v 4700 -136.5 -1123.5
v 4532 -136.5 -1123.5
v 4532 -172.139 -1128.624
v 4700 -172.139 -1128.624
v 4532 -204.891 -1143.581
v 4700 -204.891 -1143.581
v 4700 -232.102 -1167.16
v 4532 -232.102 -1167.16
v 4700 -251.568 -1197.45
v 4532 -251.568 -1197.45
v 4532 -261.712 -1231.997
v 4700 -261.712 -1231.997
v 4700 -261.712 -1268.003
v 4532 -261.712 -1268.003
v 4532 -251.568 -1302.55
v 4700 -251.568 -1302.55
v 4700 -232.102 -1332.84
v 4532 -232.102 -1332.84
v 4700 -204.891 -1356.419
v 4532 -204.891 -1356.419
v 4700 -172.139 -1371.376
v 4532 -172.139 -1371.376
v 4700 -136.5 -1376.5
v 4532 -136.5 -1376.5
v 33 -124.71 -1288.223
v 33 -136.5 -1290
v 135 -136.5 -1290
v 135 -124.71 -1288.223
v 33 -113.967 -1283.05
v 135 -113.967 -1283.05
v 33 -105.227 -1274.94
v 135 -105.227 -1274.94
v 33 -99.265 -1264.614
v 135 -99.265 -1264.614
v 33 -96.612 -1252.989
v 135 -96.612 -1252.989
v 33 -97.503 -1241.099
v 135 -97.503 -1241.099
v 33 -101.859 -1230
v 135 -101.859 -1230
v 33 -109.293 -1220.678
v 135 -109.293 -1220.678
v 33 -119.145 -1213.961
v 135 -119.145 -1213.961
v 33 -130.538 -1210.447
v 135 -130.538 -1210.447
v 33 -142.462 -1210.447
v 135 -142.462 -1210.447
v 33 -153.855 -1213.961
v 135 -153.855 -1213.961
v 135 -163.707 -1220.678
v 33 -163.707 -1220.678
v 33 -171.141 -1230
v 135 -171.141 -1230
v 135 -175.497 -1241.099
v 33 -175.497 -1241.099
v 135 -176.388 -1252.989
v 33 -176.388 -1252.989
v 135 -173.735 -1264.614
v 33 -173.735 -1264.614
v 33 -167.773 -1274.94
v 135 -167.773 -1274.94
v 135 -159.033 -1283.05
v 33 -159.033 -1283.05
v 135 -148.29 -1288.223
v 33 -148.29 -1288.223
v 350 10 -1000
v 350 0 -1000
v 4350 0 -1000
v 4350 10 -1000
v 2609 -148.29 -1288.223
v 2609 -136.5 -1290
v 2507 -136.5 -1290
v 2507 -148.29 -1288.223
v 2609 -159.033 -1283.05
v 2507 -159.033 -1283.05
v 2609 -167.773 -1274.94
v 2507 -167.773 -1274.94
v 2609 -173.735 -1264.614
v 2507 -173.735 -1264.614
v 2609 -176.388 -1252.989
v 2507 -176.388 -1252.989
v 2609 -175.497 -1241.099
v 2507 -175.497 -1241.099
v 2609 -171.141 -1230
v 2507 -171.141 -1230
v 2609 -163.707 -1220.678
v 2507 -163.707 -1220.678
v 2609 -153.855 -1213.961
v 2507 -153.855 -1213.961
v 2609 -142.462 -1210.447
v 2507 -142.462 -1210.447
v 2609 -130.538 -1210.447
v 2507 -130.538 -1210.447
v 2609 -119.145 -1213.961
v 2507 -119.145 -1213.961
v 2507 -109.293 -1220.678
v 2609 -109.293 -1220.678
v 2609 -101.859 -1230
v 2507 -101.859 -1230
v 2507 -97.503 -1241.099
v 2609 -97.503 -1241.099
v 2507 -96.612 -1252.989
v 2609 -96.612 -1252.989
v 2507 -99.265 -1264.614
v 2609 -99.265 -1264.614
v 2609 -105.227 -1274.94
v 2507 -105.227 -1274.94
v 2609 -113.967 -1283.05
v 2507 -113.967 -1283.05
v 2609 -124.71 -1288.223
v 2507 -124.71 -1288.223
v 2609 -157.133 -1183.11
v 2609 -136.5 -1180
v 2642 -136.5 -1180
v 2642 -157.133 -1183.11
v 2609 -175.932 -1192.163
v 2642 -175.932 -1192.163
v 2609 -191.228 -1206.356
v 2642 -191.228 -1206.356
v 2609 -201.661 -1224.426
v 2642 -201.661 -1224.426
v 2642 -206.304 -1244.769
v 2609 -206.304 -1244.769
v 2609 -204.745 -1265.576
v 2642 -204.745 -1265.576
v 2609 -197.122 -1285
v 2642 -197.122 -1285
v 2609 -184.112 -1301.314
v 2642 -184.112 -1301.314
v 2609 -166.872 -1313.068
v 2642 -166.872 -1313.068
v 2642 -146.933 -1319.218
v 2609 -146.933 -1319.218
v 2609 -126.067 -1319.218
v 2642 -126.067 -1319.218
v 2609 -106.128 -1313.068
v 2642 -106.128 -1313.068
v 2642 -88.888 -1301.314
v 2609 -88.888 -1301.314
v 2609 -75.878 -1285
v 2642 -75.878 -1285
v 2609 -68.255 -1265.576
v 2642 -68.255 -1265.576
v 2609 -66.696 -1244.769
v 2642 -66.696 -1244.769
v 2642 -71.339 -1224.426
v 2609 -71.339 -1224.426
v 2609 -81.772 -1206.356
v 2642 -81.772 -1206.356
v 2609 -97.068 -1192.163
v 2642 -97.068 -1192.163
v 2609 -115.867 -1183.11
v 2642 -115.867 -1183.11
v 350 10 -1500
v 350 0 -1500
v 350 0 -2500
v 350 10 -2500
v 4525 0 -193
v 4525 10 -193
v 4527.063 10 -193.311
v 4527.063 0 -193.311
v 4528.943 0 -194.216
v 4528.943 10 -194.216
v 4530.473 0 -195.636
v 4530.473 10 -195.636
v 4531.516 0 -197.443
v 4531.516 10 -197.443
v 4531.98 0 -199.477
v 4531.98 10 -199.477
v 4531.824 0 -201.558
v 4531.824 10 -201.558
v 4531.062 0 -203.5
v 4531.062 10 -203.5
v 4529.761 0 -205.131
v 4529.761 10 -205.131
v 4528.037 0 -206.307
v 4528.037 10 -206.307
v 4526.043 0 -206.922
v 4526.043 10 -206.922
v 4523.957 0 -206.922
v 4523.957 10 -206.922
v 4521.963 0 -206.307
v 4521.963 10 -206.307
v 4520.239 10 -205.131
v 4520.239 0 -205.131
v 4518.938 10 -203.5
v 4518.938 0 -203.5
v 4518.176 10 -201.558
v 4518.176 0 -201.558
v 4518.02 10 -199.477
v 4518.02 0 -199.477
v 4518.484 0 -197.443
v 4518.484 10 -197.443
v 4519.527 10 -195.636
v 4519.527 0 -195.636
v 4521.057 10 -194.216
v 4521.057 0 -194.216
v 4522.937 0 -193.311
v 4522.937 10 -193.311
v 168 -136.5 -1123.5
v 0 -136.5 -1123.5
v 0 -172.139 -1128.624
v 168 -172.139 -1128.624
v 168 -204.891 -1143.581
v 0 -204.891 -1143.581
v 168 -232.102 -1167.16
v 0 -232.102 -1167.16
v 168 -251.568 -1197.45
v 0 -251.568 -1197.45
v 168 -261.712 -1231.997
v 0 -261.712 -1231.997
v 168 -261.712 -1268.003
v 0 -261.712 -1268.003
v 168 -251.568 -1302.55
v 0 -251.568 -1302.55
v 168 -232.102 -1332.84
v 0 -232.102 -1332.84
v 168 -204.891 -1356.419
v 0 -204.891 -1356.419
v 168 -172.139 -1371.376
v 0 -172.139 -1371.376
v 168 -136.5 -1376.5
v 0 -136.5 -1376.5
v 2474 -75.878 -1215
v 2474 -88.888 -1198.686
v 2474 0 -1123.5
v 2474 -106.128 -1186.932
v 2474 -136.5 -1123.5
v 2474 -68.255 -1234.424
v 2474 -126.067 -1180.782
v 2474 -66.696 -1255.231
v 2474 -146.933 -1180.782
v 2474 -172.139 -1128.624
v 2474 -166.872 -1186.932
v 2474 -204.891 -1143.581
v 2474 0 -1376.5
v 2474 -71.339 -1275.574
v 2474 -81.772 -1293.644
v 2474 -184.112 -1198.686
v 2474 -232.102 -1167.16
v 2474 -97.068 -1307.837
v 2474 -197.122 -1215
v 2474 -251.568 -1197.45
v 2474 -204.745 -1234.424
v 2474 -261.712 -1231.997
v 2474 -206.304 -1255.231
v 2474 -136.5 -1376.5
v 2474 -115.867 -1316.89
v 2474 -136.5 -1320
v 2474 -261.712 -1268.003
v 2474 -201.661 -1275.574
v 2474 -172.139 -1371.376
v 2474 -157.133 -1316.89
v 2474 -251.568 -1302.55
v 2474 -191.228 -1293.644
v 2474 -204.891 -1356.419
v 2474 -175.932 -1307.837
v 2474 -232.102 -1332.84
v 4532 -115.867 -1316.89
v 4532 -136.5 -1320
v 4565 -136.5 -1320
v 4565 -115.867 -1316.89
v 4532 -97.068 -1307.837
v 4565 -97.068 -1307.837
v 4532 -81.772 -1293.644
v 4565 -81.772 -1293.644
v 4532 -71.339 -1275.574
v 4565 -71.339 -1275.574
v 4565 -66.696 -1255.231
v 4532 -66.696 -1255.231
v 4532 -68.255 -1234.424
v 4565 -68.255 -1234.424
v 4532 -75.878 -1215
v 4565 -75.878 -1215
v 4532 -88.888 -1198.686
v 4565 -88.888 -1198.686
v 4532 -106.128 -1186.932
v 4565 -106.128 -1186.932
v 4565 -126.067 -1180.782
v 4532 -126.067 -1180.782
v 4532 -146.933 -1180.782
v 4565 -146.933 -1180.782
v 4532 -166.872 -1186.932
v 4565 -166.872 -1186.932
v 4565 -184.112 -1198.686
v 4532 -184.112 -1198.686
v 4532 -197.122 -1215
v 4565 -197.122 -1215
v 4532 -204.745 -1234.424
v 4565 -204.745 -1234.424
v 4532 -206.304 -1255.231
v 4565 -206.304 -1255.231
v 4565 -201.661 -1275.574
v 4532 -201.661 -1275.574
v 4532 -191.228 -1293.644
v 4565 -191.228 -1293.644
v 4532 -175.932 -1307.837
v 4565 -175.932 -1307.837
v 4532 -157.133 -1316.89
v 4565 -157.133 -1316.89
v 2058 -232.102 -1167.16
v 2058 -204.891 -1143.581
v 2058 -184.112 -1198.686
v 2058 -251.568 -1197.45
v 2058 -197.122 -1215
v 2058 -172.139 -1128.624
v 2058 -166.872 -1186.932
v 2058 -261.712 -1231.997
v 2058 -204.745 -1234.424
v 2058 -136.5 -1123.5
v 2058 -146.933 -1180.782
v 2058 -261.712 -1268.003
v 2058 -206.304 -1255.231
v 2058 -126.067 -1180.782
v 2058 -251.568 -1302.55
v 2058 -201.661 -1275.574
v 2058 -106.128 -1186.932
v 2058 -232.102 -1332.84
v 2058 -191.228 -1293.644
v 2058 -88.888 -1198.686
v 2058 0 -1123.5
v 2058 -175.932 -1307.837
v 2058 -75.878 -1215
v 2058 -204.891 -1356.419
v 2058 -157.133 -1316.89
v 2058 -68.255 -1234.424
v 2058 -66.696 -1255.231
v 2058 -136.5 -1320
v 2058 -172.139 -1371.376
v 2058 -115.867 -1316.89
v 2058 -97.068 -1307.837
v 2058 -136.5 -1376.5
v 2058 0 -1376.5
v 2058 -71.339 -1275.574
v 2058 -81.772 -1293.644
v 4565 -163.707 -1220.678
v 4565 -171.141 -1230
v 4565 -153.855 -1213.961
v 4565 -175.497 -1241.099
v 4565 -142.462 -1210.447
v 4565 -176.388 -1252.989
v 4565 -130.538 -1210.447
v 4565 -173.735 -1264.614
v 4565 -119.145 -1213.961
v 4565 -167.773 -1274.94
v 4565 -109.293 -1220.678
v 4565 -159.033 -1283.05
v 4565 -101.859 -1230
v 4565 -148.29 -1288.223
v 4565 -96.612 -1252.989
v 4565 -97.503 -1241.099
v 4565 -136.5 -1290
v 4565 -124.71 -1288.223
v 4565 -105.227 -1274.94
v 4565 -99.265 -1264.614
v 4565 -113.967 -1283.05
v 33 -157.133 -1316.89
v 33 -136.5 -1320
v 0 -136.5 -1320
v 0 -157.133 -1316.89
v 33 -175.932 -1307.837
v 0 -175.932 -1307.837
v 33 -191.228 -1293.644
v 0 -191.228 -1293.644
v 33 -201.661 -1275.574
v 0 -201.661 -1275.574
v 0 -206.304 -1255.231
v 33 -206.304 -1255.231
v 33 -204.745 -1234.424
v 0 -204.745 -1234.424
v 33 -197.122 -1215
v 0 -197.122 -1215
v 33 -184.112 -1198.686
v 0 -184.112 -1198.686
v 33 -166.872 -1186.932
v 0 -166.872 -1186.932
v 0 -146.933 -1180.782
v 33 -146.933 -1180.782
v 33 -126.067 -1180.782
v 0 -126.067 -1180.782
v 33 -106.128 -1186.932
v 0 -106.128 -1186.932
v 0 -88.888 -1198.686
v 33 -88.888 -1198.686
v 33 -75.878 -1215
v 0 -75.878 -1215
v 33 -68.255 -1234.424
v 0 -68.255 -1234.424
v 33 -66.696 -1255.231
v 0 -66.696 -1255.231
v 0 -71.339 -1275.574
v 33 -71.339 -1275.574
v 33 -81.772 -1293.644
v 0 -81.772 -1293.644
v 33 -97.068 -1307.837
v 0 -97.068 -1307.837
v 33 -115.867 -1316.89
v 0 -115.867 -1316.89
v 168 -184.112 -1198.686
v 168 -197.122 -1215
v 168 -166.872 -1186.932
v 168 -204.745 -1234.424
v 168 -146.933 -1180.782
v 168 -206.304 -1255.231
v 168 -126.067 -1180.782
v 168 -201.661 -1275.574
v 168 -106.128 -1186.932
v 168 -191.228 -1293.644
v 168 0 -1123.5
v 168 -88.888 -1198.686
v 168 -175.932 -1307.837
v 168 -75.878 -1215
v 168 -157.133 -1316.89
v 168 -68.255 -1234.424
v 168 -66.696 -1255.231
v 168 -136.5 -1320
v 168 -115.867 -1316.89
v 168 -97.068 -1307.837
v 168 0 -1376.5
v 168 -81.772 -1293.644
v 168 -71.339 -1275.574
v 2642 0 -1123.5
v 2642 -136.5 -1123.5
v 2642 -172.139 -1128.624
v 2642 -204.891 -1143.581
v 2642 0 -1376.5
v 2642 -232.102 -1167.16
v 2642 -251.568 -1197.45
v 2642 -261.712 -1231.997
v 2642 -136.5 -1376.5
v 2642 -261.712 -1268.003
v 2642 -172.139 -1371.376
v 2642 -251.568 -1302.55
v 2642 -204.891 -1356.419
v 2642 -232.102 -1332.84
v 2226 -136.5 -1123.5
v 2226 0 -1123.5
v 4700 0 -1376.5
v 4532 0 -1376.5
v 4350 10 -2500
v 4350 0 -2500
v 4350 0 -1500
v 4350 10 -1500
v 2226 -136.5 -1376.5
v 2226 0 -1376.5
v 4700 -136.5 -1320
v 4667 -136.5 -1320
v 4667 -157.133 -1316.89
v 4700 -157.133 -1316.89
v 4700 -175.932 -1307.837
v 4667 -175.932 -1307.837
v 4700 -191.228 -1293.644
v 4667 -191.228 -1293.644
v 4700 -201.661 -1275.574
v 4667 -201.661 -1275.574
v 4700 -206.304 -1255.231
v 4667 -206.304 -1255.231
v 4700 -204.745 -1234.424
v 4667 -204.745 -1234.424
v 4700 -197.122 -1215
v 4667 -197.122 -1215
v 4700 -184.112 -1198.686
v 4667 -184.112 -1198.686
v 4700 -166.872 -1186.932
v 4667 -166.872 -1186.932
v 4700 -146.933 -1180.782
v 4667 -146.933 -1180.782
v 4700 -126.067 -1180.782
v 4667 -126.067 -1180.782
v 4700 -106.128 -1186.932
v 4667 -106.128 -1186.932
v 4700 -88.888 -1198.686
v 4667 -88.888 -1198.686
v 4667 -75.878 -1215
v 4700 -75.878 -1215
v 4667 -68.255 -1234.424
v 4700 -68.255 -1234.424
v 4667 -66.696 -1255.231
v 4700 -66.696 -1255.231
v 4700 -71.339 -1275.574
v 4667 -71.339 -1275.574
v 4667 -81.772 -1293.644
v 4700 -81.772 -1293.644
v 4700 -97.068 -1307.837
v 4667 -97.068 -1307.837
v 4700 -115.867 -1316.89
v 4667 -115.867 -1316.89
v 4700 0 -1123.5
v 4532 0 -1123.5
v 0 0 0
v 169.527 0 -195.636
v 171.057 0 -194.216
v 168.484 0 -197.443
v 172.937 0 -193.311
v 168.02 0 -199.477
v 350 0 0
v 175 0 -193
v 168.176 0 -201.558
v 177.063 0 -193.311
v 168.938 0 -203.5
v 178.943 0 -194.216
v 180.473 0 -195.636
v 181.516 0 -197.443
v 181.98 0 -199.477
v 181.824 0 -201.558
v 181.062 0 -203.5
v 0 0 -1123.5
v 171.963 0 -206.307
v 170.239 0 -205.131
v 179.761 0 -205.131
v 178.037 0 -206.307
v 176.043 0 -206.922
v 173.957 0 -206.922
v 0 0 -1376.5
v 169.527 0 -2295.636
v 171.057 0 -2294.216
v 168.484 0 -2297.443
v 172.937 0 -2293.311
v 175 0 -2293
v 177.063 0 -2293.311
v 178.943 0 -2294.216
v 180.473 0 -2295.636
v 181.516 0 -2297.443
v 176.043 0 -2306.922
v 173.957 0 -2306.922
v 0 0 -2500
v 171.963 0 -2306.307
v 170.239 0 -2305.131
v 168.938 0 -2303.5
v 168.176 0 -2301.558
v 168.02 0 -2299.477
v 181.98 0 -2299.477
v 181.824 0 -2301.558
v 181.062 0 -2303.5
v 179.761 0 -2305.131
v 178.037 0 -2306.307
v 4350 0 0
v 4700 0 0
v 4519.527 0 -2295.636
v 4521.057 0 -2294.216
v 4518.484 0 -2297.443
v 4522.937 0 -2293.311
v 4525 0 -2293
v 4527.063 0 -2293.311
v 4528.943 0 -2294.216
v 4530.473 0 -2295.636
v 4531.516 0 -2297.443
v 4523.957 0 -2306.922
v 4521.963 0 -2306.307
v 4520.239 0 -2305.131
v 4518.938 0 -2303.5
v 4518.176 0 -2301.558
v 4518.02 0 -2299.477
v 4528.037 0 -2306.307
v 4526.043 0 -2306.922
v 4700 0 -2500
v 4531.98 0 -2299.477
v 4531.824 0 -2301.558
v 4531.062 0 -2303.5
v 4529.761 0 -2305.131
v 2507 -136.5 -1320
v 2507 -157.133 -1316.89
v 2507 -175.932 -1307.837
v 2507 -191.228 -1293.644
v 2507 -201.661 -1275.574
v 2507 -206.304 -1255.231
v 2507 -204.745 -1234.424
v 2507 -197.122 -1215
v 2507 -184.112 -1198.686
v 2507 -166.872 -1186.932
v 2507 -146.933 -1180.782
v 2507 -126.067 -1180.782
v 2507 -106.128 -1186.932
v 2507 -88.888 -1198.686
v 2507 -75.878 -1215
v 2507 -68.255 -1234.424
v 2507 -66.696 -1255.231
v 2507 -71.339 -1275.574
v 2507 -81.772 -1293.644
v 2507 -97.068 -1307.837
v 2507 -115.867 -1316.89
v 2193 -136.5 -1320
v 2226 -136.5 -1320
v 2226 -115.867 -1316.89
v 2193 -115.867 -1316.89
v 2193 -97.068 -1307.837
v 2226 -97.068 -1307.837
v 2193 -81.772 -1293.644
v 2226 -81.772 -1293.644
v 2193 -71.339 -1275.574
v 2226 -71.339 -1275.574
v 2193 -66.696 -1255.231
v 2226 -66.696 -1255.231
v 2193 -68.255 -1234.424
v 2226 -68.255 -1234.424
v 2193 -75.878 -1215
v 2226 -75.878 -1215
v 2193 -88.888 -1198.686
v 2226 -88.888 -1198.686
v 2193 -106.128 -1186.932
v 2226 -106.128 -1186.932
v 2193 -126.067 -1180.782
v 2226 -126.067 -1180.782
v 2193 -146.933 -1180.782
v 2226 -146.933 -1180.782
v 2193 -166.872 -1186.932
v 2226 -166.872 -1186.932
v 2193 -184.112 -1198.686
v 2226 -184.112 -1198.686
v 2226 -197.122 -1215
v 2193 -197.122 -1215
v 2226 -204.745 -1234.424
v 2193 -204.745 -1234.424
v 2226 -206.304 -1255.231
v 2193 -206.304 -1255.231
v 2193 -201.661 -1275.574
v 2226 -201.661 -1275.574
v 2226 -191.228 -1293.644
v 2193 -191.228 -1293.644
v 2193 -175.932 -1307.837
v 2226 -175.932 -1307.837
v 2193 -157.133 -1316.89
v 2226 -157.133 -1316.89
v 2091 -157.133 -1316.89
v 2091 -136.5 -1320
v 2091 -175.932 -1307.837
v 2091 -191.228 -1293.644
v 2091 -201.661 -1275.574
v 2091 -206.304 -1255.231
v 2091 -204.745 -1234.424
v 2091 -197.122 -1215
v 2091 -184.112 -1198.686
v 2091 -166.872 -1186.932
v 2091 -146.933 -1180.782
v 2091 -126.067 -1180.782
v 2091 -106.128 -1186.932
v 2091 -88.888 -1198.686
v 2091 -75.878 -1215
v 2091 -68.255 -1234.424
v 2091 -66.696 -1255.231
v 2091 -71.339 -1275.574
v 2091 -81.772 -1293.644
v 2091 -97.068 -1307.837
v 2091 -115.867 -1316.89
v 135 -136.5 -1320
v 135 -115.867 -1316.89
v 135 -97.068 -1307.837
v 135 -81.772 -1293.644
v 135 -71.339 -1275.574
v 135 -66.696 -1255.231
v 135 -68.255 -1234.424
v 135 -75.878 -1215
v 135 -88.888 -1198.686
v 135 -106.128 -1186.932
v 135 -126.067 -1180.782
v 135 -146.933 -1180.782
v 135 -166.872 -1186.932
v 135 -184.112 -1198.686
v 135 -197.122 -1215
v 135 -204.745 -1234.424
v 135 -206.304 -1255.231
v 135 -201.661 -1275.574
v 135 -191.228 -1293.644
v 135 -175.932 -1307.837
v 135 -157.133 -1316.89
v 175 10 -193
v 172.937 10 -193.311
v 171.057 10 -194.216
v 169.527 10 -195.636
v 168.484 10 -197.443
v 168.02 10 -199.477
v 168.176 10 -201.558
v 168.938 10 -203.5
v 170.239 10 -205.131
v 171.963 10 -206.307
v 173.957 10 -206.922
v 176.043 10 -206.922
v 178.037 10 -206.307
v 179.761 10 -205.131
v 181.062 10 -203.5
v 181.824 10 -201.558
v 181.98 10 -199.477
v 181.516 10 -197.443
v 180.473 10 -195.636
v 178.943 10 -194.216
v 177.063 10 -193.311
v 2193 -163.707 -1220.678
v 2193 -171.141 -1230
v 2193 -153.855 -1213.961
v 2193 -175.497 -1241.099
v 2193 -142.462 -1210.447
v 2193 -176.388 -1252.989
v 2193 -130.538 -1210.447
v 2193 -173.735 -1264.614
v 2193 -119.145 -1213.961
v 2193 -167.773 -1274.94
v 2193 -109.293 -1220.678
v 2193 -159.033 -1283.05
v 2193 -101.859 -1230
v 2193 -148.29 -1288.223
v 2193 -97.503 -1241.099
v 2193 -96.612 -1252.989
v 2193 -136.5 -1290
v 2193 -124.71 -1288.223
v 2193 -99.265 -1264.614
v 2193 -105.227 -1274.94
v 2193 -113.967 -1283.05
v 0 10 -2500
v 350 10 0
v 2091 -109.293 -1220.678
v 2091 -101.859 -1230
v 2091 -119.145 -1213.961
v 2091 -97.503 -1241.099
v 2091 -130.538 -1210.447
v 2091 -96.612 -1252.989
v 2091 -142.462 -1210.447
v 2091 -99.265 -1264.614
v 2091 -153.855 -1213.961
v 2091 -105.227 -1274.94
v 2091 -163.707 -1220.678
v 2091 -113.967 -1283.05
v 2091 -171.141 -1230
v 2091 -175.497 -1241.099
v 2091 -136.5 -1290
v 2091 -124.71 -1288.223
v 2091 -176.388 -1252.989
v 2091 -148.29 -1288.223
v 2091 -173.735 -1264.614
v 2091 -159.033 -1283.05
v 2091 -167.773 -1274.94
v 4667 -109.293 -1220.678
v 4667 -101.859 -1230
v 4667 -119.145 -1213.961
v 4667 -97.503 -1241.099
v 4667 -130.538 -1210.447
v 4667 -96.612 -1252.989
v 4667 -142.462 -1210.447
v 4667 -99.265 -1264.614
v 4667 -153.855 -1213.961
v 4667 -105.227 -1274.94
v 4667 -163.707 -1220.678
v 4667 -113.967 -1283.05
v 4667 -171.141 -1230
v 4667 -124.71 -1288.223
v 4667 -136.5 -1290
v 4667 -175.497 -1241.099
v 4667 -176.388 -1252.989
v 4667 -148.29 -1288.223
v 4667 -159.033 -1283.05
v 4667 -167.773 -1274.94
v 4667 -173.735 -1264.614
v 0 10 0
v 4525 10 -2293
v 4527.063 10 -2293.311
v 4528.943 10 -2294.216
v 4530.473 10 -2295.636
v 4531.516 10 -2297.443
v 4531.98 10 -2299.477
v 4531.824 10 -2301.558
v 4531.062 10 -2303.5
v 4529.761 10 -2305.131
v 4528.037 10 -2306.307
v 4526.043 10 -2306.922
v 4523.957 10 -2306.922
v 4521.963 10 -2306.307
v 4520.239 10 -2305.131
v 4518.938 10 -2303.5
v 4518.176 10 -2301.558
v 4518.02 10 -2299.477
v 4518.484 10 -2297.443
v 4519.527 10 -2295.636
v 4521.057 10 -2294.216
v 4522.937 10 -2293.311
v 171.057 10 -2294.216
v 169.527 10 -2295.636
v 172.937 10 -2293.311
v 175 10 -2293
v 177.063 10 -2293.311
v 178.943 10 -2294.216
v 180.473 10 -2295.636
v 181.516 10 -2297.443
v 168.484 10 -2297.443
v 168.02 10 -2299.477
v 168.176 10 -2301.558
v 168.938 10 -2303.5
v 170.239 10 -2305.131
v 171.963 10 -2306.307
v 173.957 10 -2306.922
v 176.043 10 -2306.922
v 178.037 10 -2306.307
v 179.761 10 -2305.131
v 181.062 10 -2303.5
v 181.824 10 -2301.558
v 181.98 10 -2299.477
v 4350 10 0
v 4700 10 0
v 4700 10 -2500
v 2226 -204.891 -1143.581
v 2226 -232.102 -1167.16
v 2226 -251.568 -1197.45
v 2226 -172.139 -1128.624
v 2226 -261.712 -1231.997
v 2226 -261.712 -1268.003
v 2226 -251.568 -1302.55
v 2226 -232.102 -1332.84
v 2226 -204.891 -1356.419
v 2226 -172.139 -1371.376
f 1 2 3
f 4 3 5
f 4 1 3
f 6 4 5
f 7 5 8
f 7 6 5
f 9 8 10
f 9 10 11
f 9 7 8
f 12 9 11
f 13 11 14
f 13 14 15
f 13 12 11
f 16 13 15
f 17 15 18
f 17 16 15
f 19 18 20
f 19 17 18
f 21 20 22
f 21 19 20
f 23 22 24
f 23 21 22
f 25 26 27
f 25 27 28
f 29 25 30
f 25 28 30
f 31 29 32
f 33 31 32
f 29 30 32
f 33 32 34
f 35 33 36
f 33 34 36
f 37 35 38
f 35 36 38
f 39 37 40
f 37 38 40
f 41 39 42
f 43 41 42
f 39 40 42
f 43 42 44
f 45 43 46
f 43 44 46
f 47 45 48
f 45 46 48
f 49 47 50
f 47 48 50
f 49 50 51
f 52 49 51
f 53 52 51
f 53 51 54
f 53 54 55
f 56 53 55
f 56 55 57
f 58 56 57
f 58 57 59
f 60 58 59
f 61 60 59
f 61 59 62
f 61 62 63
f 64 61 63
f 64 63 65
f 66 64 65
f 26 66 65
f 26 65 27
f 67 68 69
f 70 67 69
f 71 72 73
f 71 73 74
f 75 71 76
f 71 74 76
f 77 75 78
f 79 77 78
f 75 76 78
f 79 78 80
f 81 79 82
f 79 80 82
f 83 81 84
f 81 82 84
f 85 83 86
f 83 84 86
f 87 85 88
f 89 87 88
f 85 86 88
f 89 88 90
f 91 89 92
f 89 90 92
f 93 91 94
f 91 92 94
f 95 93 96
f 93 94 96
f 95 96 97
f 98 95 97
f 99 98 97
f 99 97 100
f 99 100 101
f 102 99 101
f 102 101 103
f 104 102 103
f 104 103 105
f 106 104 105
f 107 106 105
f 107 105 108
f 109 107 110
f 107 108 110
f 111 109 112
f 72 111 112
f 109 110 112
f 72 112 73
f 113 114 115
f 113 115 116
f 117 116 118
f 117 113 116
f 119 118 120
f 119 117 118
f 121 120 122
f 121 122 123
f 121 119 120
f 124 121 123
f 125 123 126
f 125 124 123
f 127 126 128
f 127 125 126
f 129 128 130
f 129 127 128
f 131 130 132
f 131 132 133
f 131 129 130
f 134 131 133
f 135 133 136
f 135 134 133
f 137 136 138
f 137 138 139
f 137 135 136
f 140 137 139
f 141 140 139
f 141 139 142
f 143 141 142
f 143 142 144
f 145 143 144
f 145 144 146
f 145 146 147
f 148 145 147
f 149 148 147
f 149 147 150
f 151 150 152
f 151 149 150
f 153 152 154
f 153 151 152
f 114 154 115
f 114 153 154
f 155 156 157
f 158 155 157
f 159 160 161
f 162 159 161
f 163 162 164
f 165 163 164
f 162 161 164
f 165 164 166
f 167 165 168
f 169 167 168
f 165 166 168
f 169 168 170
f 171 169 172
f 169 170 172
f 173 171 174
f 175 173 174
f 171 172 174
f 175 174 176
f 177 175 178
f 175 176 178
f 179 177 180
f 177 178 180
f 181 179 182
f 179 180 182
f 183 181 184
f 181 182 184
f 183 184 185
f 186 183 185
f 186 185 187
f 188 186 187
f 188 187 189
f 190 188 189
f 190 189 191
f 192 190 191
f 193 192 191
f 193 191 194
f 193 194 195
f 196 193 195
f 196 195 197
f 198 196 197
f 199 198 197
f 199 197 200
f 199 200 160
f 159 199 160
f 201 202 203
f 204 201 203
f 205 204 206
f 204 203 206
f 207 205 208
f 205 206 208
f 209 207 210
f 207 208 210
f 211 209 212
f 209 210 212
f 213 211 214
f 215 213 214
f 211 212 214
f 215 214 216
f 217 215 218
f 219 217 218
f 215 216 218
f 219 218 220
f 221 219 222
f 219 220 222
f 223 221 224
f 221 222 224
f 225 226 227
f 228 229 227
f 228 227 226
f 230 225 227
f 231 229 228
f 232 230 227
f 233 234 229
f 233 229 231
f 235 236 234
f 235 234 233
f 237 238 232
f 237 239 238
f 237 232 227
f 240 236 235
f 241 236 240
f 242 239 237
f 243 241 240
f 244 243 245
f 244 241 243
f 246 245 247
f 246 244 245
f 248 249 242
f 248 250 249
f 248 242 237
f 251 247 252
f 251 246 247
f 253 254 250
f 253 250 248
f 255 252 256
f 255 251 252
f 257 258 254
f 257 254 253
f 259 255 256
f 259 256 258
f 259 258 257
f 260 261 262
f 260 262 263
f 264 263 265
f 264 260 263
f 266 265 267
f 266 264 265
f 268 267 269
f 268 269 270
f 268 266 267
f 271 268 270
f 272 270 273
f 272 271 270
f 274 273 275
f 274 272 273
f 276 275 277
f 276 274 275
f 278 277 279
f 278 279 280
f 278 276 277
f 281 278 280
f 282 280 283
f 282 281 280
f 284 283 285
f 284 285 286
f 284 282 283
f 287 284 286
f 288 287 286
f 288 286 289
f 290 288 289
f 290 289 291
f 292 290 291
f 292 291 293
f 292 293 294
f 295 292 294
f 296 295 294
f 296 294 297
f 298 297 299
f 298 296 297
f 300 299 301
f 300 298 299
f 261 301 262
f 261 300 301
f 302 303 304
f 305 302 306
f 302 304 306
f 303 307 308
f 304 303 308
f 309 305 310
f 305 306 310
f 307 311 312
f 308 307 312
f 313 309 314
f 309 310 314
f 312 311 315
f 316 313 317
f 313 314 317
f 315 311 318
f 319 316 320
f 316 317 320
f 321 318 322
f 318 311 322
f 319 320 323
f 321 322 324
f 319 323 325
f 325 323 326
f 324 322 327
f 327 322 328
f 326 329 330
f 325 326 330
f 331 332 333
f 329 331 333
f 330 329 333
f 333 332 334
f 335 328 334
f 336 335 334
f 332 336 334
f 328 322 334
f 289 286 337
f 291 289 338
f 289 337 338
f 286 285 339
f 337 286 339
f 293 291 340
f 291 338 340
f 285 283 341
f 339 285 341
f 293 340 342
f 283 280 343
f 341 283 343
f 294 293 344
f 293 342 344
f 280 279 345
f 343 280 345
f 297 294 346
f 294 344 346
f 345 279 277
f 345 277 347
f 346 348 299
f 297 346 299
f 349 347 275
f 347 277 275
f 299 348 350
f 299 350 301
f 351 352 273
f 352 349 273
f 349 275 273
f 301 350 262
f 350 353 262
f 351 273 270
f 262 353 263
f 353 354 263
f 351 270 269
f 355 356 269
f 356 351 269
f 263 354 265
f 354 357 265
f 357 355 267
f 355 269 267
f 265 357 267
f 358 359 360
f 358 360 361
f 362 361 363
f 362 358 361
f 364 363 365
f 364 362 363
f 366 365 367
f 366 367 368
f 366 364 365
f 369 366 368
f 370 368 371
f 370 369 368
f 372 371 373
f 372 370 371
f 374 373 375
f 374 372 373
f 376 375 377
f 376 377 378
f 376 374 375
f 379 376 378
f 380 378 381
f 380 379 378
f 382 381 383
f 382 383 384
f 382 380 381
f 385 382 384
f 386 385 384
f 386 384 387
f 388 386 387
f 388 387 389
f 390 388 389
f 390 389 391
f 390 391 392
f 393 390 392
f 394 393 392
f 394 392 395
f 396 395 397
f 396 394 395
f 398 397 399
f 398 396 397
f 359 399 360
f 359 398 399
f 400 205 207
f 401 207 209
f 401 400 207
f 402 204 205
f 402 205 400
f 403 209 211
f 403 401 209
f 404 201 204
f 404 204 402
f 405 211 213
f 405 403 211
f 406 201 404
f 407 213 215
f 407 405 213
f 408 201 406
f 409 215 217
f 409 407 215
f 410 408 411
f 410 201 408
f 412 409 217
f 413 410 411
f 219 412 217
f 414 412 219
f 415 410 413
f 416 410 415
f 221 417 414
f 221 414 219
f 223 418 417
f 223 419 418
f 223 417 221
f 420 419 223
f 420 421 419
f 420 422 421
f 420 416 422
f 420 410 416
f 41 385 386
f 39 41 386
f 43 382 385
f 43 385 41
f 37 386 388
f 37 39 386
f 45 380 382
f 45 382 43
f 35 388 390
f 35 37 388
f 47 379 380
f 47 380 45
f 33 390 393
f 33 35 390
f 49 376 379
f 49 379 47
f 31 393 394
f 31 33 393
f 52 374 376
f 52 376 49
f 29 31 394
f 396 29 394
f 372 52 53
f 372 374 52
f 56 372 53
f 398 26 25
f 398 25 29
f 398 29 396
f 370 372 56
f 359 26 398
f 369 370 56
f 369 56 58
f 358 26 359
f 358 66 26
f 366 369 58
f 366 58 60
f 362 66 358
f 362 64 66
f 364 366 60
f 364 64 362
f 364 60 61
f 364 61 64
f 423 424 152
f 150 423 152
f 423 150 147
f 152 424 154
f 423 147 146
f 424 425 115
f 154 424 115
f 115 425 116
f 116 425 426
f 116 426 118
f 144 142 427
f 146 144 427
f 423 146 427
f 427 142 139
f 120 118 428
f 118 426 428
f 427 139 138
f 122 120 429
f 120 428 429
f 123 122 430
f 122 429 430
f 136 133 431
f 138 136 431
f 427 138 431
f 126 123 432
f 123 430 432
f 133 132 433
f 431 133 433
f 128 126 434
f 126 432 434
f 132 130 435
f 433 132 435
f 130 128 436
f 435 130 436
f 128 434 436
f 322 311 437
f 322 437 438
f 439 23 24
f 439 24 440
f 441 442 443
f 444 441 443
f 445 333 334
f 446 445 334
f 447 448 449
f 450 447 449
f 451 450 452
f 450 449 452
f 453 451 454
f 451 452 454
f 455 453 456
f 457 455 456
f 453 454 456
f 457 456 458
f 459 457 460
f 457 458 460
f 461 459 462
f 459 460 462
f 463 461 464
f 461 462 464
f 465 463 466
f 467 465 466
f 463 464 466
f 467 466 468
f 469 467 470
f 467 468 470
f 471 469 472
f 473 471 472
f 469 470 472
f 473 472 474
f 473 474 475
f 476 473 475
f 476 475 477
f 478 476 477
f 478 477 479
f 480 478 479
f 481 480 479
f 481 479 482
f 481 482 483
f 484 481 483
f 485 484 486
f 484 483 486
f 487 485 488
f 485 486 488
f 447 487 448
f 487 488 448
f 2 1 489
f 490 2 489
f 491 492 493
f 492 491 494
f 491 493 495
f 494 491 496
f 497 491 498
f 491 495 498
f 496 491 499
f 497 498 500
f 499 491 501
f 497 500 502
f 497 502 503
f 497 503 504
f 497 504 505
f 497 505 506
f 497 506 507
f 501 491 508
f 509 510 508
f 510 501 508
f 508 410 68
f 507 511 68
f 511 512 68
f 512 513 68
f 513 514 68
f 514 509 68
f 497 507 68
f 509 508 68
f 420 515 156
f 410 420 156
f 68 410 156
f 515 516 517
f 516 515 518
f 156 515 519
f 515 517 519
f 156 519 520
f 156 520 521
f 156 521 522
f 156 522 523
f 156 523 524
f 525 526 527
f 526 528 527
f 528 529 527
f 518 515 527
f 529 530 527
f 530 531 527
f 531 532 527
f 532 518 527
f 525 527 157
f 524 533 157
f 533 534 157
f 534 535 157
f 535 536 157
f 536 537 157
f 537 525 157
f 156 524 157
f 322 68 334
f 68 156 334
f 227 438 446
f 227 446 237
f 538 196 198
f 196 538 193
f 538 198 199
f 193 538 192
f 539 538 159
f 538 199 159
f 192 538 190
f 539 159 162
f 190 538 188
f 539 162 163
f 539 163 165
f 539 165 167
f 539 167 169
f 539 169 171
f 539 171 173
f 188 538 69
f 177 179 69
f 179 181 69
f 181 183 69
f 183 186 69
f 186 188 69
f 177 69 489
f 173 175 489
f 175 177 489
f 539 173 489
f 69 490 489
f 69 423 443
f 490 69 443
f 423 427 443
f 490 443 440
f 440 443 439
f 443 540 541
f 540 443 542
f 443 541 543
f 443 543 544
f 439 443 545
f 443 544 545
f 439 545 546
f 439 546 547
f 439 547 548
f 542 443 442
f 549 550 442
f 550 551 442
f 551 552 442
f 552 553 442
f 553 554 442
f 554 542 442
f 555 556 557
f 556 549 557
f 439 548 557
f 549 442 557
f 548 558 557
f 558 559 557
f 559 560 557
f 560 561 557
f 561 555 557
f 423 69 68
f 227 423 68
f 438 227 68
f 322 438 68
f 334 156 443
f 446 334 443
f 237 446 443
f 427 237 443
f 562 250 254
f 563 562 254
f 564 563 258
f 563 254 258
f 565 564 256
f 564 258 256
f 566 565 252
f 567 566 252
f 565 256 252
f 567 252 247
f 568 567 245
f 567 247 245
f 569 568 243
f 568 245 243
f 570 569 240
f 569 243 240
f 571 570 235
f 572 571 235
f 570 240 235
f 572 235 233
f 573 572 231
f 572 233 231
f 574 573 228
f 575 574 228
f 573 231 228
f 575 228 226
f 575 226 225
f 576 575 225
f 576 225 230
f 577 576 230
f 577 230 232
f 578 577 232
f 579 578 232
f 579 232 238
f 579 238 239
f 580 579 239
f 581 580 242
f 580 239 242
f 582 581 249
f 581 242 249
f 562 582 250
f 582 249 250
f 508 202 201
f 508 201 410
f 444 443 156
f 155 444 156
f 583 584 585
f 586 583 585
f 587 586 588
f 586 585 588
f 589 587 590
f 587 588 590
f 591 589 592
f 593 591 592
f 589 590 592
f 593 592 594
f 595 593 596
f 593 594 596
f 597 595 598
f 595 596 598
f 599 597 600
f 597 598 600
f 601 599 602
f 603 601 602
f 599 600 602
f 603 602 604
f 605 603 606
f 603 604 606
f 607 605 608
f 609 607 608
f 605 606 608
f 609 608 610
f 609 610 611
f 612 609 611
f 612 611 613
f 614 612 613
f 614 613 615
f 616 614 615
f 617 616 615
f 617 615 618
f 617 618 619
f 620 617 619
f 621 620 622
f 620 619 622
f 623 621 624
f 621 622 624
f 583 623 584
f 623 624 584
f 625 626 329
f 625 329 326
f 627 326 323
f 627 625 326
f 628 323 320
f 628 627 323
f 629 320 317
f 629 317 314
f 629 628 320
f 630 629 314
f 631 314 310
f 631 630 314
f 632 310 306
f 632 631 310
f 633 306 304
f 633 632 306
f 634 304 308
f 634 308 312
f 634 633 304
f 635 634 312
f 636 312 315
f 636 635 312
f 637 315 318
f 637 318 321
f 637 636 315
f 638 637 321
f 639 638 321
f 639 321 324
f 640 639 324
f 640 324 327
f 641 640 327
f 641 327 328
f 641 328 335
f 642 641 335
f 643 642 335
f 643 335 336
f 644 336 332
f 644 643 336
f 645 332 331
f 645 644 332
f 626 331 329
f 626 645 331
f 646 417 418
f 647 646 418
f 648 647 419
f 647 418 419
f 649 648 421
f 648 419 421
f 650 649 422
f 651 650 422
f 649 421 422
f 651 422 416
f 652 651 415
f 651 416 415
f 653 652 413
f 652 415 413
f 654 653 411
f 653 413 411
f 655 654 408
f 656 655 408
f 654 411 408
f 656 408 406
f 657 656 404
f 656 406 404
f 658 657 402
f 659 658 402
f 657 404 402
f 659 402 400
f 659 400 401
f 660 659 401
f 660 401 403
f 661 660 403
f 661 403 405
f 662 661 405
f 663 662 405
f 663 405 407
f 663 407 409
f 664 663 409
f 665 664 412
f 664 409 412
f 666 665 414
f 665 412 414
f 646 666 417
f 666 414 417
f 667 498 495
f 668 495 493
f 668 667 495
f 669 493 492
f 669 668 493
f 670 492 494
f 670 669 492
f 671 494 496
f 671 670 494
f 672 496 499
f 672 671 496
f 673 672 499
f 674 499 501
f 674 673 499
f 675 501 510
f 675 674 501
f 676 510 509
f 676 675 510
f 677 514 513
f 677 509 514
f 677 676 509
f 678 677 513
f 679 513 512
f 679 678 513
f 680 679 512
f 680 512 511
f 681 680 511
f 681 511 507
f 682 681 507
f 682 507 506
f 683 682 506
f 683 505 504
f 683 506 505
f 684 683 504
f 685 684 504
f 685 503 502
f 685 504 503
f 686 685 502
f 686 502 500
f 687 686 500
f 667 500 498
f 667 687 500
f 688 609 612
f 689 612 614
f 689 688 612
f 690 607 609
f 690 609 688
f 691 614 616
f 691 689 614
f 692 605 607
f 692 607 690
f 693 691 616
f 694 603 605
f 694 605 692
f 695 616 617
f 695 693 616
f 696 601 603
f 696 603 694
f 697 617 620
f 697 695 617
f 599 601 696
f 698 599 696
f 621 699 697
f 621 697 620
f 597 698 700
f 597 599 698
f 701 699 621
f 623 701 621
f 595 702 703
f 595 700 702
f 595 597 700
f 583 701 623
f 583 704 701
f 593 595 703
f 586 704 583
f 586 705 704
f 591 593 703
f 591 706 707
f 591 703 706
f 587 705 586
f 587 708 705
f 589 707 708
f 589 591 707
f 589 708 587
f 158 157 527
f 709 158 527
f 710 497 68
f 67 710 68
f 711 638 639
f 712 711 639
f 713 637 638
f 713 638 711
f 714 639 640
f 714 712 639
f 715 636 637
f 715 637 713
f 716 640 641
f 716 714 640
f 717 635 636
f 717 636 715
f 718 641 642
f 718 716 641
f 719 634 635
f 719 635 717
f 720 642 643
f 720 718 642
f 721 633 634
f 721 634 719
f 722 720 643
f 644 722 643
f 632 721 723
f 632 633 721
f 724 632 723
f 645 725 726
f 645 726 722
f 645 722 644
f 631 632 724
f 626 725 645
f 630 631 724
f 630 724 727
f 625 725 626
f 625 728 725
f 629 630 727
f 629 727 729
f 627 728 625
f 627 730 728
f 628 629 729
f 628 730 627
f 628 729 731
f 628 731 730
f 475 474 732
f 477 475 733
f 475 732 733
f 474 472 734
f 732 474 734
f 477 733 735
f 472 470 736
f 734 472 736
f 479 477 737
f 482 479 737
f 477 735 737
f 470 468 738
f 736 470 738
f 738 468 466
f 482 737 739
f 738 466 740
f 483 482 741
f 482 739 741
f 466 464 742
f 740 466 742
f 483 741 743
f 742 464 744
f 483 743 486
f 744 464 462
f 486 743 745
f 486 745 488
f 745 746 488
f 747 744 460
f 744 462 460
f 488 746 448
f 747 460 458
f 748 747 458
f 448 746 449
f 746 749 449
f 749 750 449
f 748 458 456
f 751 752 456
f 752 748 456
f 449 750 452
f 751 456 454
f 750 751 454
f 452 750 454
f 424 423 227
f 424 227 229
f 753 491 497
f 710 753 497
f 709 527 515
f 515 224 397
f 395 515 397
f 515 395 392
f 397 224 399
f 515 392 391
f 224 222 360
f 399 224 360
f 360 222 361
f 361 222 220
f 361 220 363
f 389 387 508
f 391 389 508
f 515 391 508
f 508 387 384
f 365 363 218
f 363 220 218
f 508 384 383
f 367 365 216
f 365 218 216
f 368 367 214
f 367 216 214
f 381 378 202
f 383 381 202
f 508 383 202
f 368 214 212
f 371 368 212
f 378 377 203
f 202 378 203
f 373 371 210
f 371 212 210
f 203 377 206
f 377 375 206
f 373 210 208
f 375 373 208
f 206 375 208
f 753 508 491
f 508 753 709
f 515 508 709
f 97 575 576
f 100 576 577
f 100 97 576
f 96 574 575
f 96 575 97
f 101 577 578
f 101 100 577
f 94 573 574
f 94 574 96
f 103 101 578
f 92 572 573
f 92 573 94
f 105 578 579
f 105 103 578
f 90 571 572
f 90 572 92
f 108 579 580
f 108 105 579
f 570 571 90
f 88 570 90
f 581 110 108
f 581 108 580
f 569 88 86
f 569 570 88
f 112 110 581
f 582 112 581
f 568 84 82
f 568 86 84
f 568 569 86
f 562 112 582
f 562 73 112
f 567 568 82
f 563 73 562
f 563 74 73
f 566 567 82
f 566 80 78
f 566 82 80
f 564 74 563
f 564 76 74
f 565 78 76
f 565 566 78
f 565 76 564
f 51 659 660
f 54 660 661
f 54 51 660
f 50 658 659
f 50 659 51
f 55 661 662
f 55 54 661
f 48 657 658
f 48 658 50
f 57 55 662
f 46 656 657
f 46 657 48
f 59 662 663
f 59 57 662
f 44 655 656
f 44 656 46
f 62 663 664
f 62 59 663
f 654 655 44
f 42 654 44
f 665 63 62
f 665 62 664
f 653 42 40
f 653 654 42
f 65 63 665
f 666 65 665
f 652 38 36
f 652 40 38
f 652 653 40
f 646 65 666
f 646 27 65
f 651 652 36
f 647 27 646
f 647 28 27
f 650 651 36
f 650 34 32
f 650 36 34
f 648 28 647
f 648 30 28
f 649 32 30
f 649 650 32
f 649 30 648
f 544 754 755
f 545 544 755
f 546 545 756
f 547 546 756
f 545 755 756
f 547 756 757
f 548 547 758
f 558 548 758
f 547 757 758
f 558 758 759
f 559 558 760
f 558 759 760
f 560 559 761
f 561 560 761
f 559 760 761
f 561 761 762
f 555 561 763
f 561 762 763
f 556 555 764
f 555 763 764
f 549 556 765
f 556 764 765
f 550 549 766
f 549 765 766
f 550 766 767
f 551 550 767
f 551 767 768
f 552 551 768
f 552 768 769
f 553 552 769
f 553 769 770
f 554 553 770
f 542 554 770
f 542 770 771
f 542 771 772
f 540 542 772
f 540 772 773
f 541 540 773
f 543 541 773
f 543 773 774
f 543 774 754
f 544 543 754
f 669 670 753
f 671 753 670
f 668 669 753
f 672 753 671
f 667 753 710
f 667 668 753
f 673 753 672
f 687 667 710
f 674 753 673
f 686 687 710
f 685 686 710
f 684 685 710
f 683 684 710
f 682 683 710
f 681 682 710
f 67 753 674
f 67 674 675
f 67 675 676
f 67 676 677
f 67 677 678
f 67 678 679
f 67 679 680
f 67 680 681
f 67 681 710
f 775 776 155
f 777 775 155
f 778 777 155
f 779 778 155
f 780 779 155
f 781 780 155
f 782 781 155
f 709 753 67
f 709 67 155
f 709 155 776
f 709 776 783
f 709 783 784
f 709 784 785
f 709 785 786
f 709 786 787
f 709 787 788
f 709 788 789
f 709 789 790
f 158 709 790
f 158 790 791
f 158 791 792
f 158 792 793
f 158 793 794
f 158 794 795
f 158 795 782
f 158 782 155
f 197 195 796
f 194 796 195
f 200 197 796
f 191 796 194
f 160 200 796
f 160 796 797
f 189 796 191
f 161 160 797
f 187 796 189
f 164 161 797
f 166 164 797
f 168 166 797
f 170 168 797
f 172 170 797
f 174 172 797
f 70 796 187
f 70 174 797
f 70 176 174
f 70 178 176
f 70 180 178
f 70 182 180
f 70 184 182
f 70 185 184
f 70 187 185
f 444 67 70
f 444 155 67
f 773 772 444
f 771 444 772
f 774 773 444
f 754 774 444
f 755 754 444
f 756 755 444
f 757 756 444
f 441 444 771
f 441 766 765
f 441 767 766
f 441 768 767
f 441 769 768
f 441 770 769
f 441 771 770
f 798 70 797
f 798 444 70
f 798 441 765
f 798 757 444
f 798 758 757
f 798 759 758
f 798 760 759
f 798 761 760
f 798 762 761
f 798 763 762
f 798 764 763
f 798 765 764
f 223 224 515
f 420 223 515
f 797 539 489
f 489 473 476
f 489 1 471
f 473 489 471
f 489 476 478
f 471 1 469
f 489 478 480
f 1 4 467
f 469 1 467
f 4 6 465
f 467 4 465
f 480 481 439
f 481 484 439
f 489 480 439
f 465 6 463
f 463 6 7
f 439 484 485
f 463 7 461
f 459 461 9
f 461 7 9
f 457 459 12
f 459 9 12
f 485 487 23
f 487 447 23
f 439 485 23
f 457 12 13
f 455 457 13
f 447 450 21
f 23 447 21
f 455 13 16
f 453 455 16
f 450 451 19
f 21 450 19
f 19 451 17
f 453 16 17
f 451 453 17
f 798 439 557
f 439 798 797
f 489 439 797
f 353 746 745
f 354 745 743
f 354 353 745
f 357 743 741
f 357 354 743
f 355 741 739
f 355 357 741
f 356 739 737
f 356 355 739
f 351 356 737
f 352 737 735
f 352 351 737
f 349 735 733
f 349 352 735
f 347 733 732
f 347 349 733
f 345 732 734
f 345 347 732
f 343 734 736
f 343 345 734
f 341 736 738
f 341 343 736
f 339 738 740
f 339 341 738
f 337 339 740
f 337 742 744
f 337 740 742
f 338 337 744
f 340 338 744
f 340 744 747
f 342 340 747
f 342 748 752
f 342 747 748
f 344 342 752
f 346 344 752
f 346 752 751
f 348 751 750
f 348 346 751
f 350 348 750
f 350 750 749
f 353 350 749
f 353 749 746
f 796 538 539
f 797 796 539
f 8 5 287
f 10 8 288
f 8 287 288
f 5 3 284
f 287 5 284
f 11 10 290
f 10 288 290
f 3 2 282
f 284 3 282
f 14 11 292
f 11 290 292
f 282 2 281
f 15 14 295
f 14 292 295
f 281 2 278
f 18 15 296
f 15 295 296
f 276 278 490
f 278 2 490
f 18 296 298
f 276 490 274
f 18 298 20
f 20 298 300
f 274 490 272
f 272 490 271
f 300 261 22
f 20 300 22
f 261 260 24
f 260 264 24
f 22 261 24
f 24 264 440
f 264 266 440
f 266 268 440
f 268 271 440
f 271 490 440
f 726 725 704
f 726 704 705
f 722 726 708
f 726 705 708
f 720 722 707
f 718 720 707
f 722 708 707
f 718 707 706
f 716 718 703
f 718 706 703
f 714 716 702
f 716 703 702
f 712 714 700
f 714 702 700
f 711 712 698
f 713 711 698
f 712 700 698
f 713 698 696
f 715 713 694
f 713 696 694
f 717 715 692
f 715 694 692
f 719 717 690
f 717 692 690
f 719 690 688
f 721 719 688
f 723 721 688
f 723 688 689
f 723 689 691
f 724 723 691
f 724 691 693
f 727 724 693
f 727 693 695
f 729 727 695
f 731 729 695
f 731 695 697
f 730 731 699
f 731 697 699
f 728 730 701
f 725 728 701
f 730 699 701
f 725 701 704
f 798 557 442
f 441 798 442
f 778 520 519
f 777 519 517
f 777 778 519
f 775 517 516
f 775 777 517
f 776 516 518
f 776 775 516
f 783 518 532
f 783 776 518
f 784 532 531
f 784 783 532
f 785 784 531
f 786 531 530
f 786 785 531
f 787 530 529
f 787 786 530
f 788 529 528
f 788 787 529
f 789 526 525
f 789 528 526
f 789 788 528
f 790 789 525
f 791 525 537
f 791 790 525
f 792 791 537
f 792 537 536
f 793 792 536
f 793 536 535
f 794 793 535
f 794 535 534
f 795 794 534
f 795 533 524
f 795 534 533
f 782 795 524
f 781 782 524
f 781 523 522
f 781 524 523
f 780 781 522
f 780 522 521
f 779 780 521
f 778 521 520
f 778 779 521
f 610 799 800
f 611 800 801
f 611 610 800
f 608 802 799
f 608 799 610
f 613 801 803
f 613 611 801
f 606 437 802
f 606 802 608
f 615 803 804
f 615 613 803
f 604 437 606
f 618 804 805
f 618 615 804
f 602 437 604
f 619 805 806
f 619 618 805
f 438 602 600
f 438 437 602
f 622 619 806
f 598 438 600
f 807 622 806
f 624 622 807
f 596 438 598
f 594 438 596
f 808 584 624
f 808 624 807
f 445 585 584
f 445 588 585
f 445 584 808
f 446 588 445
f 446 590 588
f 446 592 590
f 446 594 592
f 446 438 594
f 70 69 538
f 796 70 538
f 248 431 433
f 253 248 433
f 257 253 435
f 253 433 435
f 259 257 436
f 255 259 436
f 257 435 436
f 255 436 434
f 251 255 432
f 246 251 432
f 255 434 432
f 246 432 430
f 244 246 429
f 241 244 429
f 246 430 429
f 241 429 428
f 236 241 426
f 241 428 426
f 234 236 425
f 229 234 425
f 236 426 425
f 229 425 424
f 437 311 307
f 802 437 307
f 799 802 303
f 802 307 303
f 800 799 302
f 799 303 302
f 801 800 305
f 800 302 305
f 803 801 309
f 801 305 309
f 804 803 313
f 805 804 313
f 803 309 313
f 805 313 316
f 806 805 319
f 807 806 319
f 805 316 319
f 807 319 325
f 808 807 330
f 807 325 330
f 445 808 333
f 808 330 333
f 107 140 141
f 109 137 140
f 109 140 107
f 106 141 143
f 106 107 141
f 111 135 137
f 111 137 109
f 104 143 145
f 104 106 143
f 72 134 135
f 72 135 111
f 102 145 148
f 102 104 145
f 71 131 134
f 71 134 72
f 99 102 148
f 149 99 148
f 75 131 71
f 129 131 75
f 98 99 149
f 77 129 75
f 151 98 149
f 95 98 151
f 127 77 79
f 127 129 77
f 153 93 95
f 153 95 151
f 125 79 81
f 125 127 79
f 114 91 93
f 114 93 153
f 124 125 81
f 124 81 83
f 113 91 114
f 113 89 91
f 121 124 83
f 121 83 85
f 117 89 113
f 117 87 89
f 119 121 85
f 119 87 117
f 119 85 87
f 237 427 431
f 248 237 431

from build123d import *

# Parameters (mm, degrees)
BOSS_EXTRUDE1_DEPTH     = 10
SKETCH3_R               = 126.5
SKETCH3_W               = 253
SKETCH3_H               = 136.5
BOSS_EXTRUDE2_DEPTH     = 168
SKETCH6_R               = 70
CUT_EXTRUDE1_DEPTH      = 33
SKETCH7_R               = 40
CUT_EXTRUDE2_DEPTH      = 5212.371604482
CUT_EXTRUDE4_START      = -33
SKETCH9_R               = 70
CUT_EXTRUDE4_DEPTH      = 33
SKETCH8_R               = 7
CUT_EXTRUDE3_DEPTH      = 5331.528022626
LPATTERN1_COUNT         = 2
LPATTERN1_PITCH         = 2058
MIRROR4_COPY_1_SKETCH_R = 126.5
MIRROR4_COPY_1_SKETCH_W = 253
MIRROR4_COPY_1_SKETCH_H = 136.5
MIRROR4_COPY_1_DEPTH    = 168
MIRROR4_COPY_2_SKETCH_R = 70
MIRROR4_COPY_2_DEPTH    = 33
MIRROR4_COPY_3_SKETCH_R = 40
MIRROR4_COPY_3_DEPTH    = 5212.371604482
MIRROR4_START           = -33
MIRROR4_COPY_4_SKETCH_R = 70
MIRROR4_COPY_4_DEPTH    = 33


with BuildPart() as part:
    # Sketch1 → Boss-Extrude1 (new body)
    with BuildSketch(Plane(origin=(0, 0, 0), x_dir=(1, 0, 0), z_dir=(0, 1, 0))):
        Polygon((0, 2500), (0, 1250), (4700, 1250), (4700, 2500), (4350, 2500), (4350, 1500), (350, 1500), (350, 2500), align=None)
        Polygon((4700, 1250), (0, 1250), (0, 0), (350, 0), (350, 1000), (4350, 1000), (4350, 0), (4700, 0), align=None)
    extrude(amount=BOSS_EXTRUDE1_DEPTH)

    # Sketch3 → Boss-Extrude2 (add)
    with BuildSketch(Plane(origin=(0, 0, 0), x_dir=(0, 0, -1), z_dir=(1, 0, 0))):
        with Locations((1250, -136.5)):
            Circle(SKETCH3_R)
        with Locations((1250, -68.25)):
            Rectangle(SKETCH3_W, SKETCH3_H)
    boss_extrude2 = extrude(amount=BOSS_EXTRUDE2_DEPTH)

    # Mirror1: Boss-Extrude2 across plane
    add(boss_extrude2.mirror(Plane.ZY.offset(-2350)))

    # Sketch6 → Cut-Extrude1 (cut)
    with BuildSketch(Plane(origin=(168, 0, 0), x_dir=(0, 0, -1), z_dir=(1, 0, 0))):
        with Locations((1250, -136.5)):
            Circle(SKETCH6_R)
    cut_extrude1 = extrude(amount=-CUT_EXTRUDE1_DEPTH, mode=Mode.SUBTRACT)

    # Sketch7 → Cut-Extrude2 (cut, through all)
    with BuildSketch(Plane(origin=(135, 0, 0), x_dir=(0, 0, -1), z_dir=(1, 0, 0))):
        with Locations((1250, -136.5)):
            Circle(SKETCH7_R)
    cut_extrude2 = extrude(amount=-CUT_EXTRUDE2_DEPTH, mode=Mode.SUBTRACT)

    # Sketch9 → Cut-Extrude4 (cut)
    with BuildSketch(Plane.ZY.offset(CUT_EXTRUDE4_START)):
        with Locations(Location((-1250, -136.5, 0), (0, 0, 180))):
            Circle(SKETCH9_R)
    cut_extrude4 = extrude(amount=CUT_EXTRUDE4_DEPTH, mode=Mode.SUBTRACT)

    # Mirror2: Cut-Extrude1, Cut-Extrude2, Cut-Extrude4 across plane
    add(cut_extrude1.mirror(Plane.ZY.offset(-2350)), mode=Mode.SUBTRACT)
    add(cut_extrude2.mirror(Plane.ZY.offset(-2350)), mode=Mode.SUBTRACT)
    add(cut_extrude4.mirror(Plane.ZY.offset(-2350)), mode=Mode.SUBTRACT)

    # Sketch8 → Cut-Extrude3 (cut, through all)
    with BuildSketch(Plane(origin=(0, 10, 0), x_dir=(1, 0, 0), z_dir=(0, 1, 0))):
        with Locations(Location((4525, 2300, 0), (0, 0, 270))):
            Circle(SKETCH8_R)
        with Locations(Location((4525, 200, 0), (0, 0, 270))):
            Circle(SKETCH8_R)
    cut_extrude3 = extrude(amount=-CUT_EXTRUDE3_DEPTH, mode=Mode.SUBTRACT)

    # Mirror3: Cut-Extrude3 across plane
    add(cut_extrude3.mirror(Plane.ZY.offset(-2350)), mode=Mode.SUBTRACT)

    # LPattern1: Boss-Extrude2, Cut-Extrude1, Cut-Extrude2, Cut-Extrude4 ×2
    with Locations(*[(i * LPATTERN1_PITCH, 0, 0) for i in range(1, LPATTERN1_COUNT)]):
        add(boss_extrude2)
        add(cut_extrude1, mode=Mode.SUBTRACT)
        add(cut_extrude2, mode=Mode.SUBTRACT)
        add(cut_extrude4, mode=Mode.SUBTRACT)

    # Mirror4: Boss-Extrude2, Cut-Extrude1, Cut-Extrude2, Cut-Extrude4 across plane
    add(boss_extrude2.mirror(Plane.ZY.offset(-2350)))
    add(cut_extrude1.mirror(Plane.ZY.offset(-2350)), mode=Mode.SUBTRACT)
    add(cut_extrude2.mirror(Plane.ZY.offset(-2350)), mode=Mode.SUBTRACT)
    add(cut_extrude4.mirror(Plane.ZY.offset(-2350)), mode=Mode.SUBTRACT)

    # Mirror4 copy 1 sketch → Mirror4 copy 1 (add)
    with BuildSketch(Plane(origin=(2642, 0, 0), x_dir=(0, 0, -1), z_dir=(-1, 0, 0))):
        with Locations((1250, 136.5)):
            Circle(MIRROR4_COPY_1_SKETCH_R)
        with Locations((1250, 68.25)):
            Rectangle(MIRROR4_COPY_1_SKETCH_W, MIRROR4_COPY_1_SKETCH_H)
    extrude(amount=MIRROR4_COPY_1_DEPTH)

    # Mirror4 copy 2 sketch → Mirror4 copy 2 (cut)
    with BuildSketch(Plane(origin=(2474, 0, 0), x_dir=(0, 0, -1), z_dir=(-1, 0, 0))):
        with Locations((1250, 136.5)):
            Circle(MIRROR4_COPY_2_SKETCH_R)
    extrude(amount=-MIRROR4_COPY_2_DEPTH, mode=Mode.SUBTRACT)

    # Mirror4 copy 3 sketch → Mirror4 copy 3 (cut, through all)
    with BuildSketch(Plane(origin=(2507, 0, 0), x_dir=(0, 0, -1), z_dir=(-1, 0, 0))):
        with Locations((1250, 136.5)):
            Circle(MIRROR4_COPY_3_SKETCH_R)
    extrude(amount=-MIRROR4_COPY_3_DEPTH, mode=Mode.SUBTRACT)

    # Mirror4 copy 4 sketch → Mirror4 copy 4 (cut)
    with BuildSketch(Plane(origin=(2642, 0, 0), x_dir=(0, 0, 1), z_dir=(1, 0, 0)).offset(MIRROR4_START)):
        with Locations((-1250, 136.5)):
            Circle(MIRROR4_COPY_4_SKETCH_R)
    extrude(amount=MIRROR4_COPY_4_DEPTH, mode=Mode.SUBTRACT)


solid = part.part
